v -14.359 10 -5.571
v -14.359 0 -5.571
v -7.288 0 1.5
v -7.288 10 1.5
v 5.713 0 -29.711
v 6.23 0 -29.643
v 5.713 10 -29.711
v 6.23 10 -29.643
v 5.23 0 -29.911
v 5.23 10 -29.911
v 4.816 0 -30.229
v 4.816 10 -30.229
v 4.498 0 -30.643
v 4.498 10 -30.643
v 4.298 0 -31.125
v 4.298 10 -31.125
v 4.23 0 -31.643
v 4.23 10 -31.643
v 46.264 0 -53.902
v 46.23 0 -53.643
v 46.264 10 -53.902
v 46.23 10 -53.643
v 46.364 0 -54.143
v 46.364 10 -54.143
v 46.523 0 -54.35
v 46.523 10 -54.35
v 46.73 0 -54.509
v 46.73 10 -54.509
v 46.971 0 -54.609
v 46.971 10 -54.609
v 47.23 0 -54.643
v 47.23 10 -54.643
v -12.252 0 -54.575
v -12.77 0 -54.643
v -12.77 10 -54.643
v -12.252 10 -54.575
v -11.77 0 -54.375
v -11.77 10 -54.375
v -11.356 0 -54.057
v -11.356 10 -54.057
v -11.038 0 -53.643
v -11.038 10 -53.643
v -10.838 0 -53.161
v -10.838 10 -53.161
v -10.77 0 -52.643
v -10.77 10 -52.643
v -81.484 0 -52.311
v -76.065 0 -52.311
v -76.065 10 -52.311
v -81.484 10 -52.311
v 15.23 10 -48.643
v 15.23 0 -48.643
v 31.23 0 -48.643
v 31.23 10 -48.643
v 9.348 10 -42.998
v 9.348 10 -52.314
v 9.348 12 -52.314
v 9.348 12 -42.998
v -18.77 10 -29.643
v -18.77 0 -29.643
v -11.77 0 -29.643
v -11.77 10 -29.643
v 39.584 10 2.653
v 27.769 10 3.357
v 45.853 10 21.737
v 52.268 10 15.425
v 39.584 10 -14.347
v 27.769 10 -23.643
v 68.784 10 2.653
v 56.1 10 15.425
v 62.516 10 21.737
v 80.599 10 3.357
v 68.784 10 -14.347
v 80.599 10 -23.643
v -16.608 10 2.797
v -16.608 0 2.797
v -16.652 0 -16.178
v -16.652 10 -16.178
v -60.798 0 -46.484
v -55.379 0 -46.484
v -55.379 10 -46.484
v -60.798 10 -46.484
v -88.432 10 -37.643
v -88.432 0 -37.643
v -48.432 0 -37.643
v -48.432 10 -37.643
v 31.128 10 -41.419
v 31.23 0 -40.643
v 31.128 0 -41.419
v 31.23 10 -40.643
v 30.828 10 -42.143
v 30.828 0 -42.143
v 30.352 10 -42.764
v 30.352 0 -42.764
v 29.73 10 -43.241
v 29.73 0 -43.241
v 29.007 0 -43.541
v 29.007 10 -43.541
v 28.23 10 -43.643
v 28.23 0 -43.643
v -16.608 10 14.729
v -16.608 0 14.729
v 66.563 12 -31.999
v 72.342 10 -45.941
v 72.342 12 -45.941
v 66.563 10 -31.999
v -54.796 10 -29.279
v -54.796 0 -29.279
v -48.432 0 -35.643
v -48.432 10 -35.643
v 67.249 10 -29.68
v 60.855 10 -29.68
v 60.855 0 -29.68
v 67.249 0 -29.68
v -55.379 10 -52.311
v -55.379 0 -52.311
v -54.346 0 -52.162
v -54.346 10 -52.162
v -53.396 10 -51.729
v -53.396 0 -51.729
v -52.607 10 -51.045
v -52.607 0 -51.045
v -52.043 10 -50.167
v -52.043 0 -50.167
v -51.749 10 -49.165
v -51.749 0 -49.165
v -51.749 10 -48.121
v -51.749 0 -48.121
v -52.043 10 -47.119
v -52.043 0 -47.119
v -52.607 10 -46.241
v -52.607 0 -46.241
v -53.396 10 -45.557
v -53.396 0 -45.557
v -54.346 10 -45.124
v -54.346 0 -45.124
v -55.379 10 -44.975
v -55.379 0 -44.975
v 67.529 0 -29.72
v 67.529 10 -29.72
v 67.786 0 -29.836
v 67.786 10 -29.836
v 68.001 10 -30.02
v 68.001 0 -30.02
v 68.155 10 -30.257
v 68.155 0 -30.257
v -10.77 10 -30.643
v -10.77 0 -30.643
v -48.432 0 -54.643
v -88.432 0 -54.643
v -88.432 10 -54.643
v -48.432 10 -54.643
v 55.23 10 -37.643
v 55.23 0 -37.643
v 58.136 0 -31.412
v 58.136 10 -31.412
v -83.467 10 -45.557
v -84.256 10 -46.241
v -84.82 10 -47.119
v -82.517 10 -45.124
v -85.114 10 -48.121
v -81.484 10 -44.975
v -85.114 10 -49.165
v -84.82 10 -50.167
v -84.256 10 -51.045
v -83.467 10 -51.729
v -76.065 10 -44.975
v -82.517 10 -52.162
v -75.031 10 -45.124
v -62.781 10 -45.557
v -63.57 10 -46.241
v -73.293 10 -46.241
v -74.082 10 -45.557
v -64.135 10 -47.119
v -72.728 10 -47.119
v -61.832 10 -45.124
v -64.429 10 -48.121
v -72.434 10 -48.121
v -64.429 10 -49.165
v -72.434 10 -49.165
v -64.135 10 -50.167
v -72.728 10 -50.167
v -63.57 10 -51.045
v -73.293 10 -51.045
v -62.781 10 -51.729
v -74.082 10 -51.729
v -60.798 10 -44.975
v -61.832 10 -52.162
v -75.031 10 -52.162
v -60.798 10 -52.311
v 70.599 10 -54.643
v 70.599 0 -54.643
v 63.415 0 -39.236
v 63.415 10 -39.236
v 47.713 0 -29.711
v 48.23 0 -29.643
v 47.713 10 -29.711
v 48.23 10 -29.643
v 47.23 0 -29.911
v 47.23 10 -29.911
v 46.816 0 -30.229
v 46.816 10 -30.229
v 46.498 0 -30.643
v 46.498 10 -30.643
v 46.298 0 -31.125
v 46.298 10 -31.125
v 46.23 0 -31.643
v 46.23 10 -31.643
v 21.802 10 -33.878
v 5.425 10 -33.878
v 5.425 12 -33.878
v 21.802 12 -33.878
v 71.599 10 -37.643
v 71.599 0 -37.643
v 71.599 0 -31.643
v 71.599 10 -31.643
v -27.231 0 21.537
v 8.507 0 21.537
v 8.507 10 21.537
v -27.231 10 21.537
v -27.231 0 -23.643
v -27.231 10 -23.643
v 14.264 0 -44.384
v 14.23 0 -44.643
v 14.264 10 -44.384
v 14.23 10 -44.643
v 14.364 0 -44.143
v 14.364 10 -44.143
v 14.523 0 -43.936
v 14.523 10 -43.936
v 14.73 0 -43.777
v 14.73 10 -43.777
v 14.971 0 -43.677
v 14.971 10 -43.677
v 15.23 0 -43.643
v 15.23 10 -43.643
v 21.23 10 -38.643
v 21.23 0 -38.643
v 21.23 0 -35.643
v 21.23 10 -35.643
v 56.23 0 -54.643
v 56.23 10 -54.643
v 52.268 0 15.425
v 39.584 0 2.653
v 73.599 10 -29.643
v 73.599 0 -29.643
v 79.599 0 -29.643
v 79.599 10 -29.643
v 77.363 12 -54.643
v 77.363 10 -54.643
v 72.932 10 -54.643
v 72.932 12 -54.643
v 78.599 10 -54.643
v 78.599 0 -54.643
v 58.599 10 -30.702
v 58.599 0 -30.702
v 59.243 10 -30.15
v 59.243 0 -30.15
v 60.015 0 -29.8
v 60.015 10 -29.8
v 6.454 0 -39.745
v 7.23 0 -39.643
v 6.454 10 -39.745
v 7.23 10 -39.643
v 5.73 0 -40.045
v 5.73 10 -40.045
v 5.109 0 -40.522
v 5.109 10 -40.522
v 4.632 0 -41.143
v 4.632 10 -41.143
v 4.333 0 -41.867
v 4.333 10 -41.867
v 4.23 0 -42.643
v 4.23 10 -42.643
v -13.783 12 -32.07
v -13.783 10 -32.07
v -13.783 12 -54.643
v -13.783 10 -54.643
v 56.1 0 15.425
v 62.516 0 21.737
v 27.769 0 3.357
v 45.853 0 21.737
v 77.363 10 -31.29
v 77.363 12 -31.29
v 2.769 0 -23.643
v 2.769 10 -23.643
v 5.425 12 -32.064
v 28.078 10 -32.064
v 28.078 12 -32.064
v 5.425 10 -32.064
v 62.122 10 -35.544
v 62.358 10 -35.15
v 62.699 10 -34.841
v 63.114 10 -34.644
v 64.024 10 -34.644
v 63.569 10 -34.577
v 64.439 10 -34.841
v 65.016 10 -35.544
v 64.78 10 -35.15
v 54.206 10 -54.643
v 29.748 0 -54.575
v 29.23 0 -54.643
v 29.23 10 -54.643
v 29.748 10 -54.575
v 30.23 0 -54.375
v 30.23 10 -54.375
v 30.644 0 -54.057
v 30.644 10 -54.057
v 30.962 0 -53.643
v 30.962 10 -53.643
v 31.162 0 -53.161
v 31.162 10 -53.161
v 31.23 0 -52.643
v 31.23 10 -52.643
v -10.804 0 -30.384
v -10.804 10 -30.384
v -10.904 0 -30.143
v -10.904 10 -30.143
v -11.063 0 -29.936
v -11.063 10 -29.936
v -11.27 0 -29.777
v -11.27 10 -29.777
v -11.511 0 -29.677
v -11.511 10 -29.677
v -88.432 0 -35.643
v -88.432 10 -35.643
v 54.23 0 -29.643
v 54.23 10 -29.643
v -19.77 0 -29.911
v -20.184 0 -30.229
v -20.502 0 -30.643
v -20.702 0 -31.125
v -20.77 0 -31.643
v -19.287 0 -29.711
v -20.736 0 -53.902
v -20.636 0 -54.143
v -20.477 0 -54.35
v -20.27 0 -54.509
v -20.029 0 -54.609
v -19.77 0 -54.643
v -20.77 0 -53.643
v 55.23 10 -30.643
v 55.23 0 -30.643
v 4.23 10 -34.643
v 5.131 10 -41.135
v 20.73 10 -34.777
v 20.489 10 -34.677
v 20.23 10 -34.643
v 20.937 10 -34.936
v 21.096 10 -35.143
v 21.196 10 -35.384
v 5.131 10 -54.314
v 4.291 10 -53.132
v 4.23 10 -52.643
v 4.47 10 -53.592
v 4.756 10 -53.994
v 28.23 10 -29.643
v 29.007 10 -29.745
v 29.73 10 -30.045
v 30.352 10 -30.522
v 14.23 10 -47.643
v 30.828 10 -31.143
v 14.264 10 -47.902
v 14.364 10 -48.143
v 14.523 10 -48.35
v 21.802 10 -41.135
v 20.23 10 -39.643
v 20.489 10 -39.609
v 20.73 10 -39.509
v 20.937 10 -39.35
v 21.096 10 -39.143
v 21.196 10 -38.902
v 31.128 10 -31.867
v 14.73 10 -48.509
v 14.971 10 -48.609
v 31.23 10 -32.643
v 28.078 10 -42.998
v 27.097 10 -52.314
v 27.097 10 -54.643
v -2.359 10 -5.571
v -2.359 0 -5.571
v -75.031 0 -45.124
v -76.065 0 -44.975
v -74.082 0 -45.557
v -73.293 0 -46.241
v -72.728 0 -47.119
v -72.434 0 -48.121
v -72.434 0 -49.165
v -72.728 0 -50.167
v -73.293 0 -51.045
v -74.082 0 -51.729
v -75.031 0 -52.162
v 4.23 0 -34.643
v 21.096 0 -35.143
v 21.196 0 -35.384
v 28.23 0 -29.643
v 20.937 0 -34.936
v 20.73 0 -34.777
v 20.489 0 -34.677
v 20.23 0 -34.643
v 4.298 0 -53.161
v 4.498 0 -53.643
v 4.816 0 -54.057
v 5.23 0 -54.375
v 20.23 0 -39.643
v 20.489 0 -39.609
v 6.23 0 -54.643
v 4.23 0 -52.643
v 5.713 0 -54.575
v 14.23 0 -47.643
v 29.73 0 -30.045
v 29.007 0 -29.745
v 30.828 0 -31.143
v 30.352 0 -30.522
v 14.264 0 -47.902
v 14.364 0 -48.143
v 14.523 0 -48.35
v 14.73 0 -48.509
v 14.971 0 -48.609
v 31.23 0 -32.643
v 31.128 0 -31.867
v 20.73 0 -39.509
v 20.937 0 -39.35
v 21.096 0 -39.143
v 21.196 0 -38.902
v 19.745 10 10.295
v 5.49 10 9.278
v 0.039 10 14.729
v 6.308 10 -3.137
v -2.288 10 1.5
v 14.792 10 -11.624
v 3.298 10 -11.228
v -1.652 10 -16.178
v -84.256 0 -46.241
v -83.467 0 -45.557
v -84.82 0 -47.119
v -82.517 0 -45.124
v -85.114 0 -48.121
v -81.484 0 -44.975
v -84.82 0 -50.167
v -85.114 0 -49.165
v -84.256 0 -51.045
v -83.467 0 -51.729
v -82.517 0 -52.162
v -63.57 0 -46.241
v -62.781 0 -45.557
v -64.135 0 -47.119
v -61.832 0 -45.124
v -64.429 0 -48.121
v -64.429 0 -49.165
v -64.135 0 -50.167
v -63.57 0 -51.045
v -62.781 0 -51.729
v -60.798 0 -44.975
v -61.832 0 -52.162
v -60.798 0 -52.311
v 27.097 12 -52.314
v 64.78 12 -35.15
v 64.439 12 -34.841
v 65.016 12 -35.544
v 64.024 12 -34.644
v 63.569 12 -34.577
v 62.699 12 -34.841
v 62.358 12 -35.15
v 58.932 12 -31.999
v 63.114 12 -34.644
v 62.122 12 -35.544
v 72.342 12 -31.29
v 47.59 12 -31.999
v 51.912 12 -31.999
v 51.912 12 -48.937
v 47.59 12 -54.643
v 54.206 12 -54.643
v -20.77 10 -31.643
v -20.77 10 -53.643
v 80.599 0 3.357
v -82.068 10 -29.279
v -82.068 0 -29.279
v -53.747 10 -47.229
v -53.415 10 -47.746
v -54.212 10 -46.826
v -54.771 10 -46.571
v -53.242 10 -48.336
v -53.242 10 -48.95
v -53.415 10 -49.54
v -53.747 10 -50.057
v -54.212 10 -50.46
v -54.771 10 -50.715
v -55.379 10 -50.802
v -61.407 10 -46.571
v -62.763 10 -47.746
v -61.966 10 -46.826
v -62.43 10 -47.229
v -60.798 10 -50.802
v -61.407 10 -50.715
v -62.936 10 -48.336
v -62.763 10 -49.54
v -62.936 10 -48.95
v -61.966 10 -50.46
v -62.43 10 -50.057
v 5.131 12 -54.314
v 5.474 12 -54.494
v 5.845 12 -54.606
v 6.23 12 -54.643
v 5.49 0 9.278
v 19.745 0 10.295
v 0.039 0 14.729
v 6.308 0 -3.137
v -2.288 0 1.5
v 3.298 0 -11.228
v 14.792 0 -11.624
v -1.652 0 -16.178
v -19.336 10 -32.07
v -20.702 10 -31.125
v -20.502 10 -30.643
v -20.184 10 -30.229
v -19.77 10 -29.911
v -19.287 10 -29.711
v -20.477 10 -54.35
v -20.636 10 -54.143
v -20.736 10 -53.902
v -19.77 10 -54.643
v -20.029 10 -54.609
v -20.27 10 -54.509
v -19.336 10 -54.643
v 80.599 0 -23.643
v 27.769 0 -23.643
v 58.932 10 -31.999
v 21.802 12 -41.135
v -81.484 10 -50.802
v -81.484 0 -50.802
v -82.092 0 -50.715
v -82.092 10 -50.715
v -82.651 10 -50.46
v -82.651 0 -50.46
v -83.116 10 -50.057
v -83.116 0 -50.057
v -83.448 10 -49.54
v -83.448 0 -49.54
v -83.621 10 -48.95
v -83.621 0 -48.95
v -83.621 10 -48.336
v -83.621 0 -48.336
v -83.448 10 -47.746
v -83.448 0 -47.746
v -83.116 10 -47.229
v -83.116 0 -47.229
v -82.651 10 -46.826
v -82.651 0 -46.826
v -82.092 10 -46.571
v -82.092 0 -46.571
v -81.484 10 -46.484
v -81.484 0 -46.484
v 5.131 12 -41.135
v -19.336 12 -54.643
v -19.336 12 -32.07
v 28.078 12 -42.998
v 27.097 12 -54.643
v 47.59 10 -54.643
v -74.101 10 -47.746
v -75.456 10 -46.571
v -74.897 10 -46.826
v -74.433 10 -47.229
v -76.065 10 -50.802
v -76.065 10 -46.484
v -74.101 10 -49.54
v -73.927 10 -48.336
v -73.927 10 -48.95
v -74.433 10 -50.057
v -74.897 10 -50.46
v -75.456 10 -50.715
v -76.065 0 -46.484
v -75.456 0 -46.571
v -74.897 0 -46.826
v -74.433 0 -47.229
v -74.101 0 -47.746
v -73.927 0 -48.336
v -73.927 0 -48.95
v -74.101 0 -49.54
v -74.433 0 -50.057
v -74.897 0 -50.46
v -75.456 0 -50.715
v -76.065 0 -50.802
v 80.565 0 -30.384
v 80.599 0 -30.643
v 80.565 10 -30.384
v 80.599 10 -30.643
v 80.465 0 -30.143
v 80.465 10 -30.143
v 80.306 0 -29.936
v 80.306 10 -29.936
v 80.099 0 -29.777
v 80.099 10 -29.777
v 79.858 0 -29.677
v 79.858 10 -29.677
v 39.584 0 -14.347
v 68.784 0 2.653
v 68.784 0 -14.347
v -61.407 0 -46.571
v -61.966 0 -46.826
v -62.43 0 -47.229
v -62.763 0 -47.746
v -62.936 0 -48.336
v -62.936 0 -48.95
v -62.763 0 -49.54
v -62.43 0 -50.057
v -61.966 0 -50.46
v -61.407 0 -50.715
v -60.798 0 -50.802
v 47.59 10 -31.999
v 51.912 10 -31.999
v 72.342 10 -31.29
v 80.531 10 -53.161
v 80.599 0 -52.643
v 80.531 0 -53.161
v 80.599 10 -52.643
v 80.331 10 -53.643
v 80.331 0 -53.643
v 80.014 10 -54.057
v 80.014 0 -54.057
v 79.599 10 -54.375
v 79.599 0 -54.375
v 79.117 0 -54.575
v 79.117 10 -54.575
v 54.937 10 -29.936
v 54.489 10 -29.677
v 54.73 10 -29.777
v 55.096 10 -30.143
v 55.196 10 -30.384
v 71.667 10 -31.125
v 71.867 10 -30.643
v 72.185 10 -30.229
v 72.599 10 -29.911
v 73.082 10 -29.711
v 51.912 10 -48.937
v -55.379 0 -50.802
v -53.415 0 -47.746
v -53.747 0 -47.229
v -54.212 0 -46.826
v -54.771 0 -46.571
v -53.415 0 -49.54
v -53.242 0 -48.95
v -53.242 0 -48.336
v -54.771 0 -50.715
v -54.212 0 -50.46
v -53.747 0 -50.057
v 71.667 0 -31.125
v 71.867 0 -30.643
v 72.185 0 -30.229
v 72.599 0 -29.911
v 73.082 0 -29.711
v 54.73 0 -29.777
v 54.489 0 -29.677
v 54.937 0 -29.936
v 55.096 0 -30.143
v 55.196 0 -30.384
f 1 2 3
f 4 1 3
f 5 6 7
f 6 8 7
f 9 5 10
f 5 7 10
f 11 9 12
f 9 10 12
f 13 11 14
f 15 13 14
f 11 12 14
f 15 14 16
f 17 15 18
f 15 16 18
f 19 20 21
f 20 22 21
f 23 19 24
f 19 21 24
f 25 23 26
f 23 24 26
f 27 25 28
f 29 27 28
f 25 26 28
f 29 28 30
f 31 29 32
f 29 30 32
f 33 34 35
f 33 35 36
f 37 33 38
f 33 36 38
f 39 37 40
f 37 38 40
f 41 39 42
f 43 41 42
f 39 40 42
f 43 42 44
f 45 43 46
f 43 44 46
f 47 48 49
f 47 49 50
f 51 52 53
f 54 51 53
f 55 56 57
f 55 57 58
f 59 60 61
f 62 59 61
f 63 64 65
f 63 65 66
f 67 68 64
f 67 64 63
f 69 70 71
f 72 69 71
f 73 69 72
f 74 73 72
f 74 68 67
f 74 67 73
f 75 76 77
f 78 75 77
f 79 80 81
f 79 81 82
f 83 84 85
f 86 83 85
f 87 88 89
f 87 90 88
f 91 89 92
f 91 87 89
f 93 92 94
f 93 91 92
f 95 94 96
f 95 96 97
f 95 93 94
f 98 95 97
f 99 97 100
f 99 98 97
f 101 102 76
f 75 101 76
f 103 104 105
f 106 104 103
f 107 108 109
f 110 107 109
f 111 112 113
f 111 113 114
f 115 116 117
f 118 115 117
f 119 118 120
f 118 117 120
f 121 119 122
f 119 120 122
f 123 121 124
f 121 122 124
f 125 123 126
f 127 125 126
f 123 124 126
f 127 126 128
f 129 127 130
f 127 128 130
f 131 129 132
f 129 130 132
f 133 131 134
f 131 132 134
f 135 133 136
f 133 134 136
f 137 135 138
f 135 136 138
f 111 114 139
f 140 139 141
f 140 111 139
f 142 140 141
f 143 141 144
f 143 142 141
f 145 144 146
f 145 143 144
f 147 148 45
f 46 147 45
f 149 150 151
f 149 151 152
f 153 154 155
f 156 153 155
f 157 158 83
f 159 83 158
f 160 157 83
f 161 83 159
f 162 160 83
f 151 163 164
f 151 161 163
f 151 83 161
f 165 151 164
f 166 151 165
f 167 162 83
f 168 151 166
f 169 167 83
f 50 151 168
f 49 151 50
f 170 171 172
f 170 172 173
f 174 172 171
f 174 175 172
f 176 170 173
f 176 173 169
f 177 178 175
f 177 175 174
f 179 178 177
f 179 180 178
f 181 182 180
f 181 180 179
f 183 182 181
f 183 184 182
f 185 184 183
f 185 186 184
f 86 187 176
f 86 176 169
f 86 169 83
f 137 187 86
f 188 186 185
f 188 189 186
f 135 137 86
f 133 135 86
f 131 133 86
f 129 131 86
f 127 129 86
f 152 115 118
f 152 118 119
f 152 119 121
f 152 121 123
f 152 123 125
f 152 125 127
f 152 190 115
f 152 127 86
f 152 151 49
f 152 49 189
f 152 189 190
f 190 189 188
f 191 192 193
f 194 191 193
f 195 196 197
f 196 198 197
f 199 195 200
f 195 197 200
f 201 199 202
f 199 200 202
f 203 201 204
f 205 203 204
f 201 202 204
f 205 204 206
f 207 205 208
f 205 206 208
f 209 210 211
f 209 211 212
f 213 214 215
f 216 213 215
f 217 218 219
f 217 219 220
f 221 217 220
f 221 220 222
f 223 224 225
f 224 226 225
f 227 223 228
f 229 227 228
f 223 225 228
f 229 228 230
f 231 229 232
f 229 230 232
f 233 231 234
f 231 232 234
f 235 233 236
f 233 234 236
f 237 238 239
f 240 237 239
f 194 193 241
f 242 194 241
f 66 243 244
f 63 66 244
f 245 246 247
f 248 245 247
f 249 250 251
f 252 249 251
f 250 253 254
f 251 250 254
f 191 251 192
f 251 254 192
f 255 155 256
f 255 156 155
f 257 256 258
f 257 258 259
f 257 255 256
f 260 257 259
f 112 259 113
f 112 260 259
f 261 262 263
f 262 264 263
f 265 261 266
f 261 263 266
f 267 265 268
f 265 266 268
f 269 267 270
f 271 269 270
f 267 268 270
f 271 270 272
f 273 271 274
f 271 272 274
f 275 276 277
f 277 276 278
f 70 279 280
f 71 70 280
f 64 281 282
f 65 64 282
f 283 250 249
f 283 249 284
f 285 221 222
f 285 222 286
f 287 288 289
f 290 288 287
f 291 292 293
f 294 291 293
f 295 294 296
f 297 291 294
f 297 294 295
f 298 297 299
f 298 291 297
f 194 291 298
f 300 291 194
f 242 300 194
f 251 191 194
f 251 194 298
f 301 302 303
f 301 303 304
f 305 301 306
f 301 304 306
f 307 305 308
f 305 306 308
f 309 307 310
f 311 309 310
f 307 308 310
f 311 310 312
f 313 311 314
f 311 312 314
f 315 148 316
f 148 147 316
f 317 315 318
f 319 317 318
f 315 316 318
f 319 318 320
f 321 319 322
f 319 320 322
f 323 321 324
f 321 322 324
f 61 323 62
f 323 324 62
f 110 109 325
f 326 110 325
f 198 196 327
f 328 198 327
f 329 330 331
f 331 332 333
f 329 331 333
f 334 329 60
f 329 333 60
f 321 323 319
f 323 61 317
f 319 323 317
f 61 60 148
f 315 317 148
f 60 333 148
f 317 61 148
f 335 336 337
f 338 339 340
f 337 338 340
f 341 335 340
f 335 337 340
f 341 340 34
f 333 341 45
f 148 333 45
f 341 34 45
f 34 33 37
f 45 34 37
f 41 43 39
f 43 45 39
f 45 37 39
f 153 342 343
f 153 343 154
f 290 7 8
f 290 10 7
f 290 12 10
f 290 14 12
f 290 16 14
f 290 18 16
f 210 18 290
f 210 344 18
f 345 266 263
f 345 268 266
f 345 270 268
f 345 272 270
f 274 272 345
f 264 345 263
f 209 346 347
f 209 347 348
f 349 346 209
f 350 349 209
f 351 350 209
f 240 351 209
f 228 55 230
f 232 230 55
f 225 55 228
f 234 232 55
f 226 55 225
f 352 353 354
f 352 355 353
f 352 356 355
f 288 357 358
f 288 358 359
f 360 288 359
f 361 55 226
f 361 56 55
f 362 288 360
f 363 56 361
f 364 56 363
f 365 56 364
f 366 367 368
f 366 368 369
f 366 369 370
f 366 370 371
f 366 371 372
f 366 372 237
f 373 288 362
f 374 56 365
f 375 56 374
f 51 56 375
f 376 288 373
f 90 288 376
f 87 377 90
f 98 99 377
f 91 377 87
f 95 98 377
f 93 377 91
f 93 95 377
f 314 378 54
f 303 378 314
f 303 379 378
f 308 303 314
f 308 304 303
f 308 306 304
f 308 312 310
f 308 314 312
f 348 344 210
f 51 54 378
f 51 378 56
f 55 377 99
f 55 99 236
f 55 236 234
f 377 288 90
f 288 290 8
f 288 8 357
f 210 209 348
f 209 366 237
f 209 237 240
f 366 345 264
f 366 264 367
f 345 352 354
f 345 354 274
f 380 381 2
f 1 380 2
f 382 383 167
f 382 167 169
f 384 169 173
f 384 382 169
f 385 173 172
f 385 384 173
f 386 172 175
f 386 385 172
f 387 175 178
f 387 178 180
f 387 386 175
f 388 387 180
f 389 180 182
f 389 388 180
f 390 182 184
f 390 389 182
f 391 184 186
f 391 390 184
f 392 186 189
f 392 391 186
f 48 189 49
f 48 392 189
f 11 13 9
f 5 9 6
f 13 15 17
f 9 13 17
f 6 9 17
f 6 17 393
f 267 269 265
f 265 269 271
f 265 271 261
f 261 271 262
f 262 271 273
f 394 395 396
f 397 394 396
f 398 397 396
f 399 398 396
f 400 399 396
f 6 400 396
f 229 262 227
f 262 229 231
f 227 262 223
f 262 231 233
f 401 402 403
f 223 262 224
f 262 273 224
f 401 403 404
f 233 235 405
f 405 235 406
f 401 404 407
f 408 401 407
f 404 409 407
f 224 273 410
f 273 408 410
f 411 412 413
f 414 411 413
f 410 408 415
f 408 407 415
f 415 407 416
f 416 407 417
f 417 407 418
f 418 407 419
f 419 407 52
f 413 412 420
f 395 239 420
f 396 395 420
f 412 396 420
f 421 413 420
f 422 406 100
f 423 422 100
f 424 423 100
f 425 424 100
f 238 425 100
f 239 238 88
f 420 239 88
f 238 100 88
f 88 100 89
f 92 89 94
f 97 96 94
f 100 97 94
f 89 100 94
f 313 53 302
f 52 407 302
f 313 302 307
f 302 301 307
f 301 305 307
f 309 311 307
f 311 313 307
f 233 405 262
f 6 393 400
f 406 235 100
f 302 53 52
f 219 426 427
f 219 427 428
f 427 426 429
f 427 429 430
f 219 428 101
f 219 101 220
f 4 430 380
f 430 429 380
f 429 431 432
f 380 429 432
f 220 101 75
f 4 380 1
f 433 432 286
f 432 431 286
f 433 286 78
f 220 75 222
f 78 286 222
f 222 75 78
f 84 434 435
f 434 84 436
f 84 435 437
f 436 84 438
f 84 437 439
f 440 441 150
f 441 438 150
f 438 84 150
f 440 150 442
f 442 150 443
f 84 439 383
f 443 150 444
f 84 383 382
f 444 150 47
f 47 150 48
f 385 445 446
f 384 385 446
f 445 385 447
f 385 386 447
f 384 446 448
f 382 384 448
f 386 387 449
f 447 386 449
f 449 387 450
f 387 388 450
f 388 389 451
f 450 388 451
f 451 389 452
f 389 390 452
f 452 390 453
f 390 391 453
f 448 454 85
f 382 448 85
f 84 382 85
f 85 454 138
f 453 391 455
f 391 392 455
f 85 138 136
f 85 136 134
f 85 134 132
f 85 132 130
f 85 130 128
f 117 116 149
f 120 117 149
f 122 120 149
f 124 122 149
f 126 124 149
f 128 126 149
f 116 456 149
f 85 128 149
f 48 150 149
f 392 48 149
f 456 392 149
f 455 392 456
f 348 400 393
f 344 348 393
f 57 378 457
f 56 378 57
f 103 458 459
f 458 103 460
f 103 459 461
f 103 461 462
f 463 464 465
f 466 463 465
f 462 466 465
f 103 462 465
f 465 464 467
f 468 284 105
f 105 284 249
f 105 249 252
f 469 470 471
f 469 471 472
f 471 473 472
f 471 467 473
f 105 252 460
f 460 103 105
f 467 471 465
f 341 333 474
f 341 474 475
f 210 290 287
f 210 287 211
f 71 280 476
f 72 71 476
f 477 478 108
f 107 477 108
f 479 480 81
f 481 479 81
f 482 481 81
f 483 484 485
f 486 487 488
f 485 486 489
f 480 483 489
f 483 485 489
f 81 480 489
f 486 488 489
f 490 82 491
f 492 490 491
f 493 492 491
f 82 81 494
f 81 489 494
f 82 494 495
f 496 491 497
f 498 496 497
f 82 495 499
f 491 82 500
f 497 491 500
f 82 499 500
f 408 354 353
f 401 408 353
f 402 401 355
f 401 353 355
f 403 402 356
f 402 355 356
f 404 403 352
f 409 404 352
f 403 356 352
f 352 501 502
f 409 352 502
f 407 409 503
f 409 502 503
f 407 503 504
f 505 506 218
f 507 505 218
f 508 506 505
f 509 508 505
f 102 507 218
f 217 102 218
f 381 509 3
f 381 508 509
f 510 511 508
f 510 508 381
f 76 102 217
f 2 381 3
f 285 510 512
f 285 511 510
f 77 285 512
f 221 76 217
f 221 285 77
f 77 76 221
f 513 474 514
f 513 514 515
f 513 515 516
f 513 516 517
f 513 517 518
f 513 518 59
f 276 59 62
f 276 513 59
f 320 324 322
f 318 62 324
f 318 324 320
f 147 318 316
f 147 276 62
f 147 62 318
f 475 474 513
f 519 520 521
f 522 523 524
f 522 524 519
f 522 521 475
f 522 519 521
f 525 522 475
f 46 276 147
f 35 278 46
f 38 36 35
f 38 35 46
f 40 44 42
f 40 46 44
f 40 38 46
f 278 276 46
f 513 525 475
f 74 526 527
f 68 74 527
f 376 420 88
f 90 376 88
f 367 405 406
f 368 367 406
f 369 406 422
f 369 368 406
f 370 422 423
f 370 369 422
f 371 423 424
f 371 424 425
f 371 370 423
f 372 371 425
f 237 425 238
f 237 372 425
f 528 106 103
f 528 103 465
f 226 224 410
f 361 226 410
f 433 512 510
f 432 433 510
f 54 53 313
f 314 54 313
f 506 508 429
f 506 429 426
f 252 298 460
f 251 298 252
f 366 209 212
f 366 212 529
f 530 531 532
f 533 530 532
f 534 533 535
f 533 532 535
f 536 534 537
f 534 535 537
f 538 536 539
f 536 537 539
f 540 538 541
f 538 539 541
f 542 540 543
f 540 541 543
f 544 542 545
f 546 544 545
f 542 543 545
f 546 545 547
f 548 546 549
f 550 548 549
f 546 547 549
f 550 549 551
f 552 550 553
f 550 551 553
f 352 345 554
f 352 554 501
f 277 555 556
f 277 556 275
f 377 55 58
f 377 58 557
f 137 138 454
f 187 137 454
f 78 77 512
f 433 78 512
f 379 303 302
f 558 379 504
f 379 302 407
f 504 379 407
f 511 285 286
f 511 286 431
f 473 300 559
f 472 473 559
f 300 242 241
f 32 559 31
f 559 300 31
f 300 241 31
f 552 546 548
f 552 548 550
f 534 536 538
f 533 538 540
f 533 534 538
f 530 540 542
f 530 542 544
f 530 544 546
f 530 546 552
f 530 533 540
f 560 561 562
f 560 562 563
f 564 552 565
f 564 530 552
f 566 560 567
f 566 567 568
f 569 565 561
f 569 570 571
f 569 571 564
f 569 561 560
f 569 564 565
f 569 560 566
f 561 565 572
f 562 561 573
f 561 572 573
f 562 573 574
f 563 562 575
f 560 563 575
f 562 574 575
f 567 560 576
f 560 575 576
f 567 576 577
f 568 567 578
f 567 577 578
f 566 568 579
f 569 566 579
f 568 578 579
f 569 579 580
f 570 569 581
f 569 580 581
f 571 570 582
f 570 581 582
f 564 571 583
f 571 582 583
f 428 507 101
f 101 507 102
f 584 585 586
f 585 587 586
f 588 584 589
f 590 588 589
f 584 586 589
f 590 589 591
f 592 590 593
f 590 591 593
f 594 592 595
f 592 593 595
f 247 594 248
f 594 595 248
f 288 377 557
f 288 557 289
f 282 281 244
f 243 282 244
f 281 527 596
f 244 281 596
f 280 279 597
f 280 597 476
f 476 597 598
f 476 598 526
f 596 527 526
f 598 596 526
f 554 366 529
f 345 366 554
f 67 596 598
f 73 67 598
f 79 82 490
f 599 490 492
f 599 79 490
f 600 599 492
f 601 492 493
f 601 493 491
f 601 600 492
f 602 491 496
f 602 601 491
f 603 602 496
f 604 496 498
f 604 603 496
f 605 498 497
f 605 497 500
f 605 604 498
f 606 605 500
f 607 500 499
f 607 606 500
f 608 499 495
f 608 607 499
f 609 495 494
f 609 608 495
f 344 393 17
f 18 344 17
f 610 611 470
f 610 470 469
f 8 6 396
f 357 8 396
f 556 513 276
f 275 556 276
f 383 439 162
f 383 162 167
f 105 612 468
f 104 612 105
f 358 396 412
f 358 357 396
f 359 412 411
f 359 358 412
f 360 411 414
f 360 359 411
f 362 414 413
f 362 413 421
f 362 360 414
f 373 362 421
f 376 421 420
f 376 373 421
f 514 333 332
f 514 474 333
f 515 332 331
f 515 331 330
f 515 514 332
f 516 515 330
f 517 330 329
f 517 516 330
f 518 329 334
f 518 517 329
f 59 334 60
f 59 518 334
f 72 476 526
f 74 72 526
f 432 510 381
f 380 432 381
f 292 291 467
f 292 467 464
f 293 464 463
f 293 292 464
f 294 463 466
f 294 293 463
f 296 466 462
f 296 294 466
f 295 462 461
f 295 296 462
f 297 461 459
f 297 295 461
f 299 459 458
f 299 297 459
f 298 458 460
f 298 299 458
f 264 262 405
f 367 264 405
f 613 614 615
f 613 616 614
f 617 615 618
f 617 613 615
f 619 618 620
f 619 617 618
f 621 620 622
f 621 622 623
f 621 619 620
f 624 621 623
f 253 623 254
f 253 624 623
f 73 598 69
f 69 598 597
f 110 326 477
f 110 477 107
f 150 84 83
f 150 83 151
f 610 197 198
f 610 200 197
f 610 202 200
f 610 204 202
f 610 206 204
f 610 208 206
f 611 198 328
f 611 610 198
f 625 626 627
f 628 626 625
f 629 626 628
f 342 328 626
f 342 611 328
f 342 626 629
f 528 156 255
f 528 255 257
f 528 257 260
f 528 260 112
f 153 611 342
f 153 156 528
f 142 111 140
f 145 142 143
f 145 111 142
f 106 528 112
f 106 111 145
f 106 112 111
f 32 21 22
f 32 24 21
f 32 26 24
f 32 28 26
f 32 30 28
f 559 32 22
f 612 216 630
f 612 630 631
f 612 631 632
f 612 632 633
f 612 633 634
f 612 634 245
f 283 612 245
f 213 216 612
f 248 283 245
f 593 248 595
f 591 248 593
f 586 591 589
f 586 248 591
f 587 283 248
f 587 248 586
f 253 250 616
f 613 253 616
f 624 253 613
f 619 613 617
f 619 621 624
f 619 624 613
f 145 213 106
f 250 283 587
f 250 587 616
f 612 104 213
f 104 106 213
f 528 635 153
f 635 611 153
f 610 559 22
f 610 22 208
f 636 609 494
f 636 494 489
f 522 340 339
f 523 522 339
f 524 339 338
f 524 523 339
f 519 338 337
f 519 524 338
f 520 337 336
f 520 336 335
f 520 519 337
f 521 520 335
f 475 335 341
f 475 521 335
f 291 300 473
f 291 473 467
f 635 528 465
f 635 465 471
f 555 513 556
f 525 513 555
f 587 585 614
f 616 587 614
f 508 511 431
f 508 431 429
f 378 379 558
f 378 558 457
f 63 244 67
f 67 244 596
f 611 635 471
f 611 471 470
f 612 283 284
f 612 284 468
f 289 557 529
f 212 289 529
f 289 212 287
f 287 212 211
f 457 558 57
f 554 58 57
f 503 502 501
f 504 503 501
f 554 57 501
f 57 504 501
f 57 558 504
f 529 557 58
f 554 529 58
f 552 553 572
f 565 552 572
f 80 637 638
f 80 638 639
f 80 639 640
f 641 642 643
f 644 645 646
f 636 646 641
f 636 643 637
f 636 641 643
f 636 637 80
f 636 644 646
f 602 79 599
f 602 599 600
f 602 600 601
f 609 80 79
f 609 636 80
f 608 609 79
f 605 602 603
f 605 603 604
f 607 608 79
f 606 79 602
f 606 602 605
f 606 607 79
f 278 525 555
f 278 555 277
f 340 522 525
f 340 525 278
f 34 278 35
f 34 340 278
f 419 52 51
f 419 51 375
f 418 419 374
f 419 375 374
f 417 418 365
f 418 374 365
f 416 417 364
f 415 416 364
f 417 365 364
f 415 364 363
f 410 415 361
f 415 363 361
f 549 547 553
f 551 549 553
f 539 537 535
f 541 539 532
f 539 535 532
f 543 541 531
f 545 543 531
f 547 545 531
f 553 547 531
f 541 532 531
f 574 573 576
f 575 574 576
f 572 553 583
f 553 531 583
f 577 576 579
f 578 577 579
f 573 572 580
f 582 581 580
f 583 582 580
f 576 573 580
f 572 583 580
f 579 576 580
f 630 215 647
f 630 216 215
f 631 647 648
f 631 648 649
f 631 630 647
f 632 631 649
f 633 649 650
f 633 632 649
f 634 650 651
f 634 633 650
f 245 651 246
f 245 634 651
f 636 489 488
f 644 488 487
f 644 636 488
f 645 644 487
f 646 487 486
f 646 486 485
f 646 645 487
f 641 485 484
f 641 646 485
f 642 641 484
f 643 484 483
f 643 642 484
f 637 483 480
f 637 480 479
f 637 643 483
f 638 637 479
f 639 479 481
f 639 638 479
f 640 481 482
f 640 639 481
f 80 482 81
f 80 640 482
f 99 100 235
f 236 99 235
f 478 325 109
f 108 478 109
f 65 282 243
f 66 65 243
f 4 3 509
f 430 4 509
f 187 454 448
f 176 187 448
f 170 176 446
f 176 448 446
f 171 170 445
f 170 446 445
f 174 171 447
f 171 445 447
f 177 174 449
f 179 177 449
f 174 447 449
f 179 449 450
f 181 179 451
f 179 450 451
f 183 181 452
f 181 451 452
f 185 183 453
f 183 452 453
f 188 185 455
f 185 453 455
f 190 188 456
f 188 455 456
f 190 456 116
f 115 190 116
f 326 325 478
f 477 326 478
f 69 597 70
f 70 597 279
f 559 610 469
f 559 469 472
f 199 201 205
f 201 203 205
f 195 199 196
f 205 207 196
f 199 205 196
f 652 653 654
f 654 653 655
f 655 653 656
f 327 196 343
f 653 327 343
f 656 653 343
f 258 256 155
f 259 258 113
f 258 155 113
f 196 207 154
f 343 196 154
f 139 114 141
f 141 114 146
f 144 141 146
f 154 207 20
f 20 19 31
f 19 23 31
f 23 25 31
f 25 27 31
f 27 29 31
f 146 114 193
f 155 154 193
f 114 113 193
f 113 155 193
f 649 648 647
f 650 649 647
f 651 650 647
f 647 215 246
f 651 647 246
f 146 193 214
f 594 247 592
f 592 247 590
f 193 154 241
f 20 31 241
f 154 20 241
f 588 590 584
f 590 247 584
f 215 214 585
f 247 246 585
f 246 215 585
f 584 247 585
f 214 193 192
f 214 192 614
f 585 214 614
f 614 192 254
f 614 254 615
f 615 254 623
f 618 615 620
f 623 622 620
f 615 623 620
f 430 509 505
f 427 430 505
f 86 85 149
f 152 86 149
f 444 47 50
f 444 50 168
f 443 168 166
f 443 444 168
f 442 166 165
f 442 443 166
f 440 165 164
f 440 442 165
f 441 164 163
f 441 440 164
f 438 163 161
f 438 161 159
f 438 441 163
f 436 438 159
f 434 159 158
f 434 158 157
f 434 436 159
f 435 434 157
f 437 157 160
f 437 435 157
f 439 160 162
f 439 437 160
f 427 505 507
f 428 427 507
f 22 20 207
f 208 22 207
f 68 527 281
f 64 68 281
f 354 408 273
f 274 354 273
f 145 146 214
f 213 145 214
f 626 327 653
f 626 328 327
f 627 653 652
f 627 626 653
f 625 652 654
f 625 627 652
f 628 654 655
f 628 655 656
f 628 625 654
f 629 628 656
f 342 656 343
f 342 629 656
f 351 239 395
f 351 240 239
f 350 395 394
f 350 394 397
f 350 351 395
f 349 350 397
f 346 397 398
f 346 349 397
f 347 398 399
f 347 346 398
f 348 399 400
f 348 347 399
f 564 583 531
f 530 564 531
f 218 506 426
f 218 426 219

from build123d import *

# Parameters (mm, degrees)
BOSS_EXTRUDE1_DEPTH   = 10
BOSS_EXTRUDE1_2_DEPTH = 10
BOSS_EXTRUDE1_3_DEPTH = 10
BOSS_EXTRUDE1_4_DEPTH = 10
SKETCH2_W             = 10
SKETCH2_H             = 25
BOSS_EXTRUDE1_5_DEPTH = 10
BOSS_EXTRUDE1_6_DEPTH = 10
SKETCH2_W_2           = 40
SKETCH2_H_2           = 17
BOSS_EXTRUDE1_7_DEPTH = 10
BOSS_EXTRUDE1_8_DEPTH = 10
BOSS_EXTRUDE1_9_DEPTH = 10
SKETCH3_W             = 5.552922641
SKETCH3_H             = 22.573169384
BOSS_EXTRUDE2_DEPTH   = 2
BOSS_EXTRUDE3_DEPTH   = 2
BOSS_EXTRUDE4_DEPTH   = 2
FILLET1_R             = 3
FILLET2_R             = 2
FILLET3_R             = 3
FILLET4_R             = 1
FILLET5_R             = 3
FILLET6_R             = 2
FILLET7_R             = 1
FILLET8_R             = 2
FILLET9_R             = 2
FILLET10_R            = 1


with BuildPart() as part:
    # Sketch2 → Boss-Extrude1 (new body)
    with BuildSketch(Plane(origin=(0, 0, 0), x_dir=(1, 0, 0), z_dir=(0, 1, 0))):
        Polygon((8.507188085, -21.536984564), (-27.230698714, -21.536984564), (-27.230698714, 23.643015436), (2.769301286, 23.643015436), (14.792005366, 11.624089252), (6.308057472, 3.137474608), (19.745197326, -10.295442892), align=None)
        Polygon((5.490159492, -9.277894373), (0.038625294, -14.729428571), (-16.608, -14.729428571), (-16.608, -2.796857143), (-16.651976131, 16.17794975), (-1.651976131, 16.17794975), (3.297771337, 11.228202282), (-2.359082913, 5.571348032), (-14.359082913, 5.571348032), (-7.288015101, -1.49971978), (-2.288015101, -1.49971978), align=None, mode=Mode.SUBTRACT)
    extrude(amount=BOSS_EXTRUDE1_DEPTH)


with BuildPart() as body_2:
    # Sketch2 → Boss-Extrude1 2 (new body)
    with BuildSketch(Plane(origin=(0, 0, 0), x_dir=(1, 0, 0), z_dir=(0, 1, 0))):
        Polygon((52.268367855, -15.424806221), (39.584301286, -2.653179258), (39.584301286, 14.346820742), (68.784301286, 14.346820742), (68.784301286, -2.653179258), (56.100234718, -15.424806221), (62.515689668, -21.736853256), (80.599301286, -3.356984564), (80.599301286, 23.643015436), (27.769301286, 23.643015436), (27.769301286, -3.356984564), (45.852912904, -21.736853256), align=None)
    extrude(amount=BOSS_EXTRUDE1_2_DEPTH)


with BuildPart() as body_3:
    # Sketch2 → Boss-Extrude1 3 (new body)
    with BuildSketch(Plane(origin=(0, 0, 0), x_dir=(1, 0, 0), z_dir=(0, 1, 0))):
        Polygon((71.599301286, 29.643015436), (80.599301286, 29.643015436), (80.599301286, 54.643015436), (70.599301286, 54.643015436), (63.414790837, 39.235783056), (56.230280387, 54.643015436), (46.230280387, 54.643015436), (46.230280387, 29.643015436), (55.230280387, 29.643015436), (55.230280387, 37.643015436), (58.943621004, 29.679730786), (63.38596067, 29.679730786), (63.414790837, 29.679730786), (67.88596067, 29.679730786), (71.599301286, 37.643015436), align=None)
    extrude(amount=BOSS_EXTRUDE1_3_DEPTH)

    # Sketch5 → Boss-Extrude4 (add)
    with BuildSketch(Plane(origin=(0, 10, 0), x_dir=(1, 0, 0), z_dir=(0, 1, 0))):
        with BuildLine():
            Line((47.589769515, 31.999354556), (47.589769515, 54.643015436))
            Line((47.589769515, 54.643015436), (54.206017768, 54.643015436))
            Line((54.206017768, 54.643015436), (62.121886213, 35.543773263))
            ThreePointArc((62.121886213, 35.543773263), (63.569190519, 34.576935425), (65.016494824, 35.543773263))
            Line((65.016494824, 35.543773263), (72.93236327, 54.643015436))
            Line((72.93236327, 54.643015436), (77.362886653, 54.643015436))
            Line((77.362886653, 54.643015436), (77.362886653, 31.290470814))
            Line((77.362886653, 31.290470814), (72.341626818, 31.290470814))
            Line((72.341626818, 31.290470814), (72.341626818, 45.940734803))
            Line((72.341626818, 45.940734803), (66.563484891, 31.999354556))
            Line((66.563484891, 31.999354556), (58.931909377, 31.999354556))
            Line((58.931909377, 31.999354556), (51.911817177, 48.9372865))
            Line((51.911817177, 48.9372865), (51.911817177, 31.999354556))
            Line((51.911817177, 31.999354556), (47.589769515, 31.999354556))
        make_face()
    extrude(amount=BOSS_EXTRUDE4_DEPTH)

    # Fillet5
    fillet5_edges = [body_3.edges().sort_by_distance(p)[0] for p in [
        (58.943621004, 5, -29.679730786),
    ]]
    fillet(fillet5_edges, radius=FILLET5_R)

    # Fillet6
    fillet6_edges = [body_3.edges().sort_by_distance(p)[0] for p in [
        (80.599301286, 5, -54.643015436),
        (71.599301286, 5, -29.643015436),
        (46.230280387, 5, -29.643015436),
    ]]
    fillet(fillet6_edges, radius=FILLET6_R)

    # Fillet7
    fillet7_edges = [body_3.edges().sort_by_distance(p)[0] for p in [
        (80.599301286, 5, -29.643015436),
        (67.88596067, 5, -29.679730786),
        (55.230280387, 5, -29.643015436),
        (46.230280387, 5, -54.643015436),
    ]]
    fillet(fillet7_edges, radius=FILLET7_R)


with BuildPart() as body_4:
    # Sketch2 → Boss-Extrude1 4 (new body)
    with BuildSketch(Plane(origin=(0, 0, 0), x_dir=(1, 0, 0), z_dir=(0, 1, 0))):
        Polygon((4.230280387, 29.643015436), (31.230280387, 29.643015436), (31.230280387, 43.643015436), (14.230280387, 43.643015436), (14.230280387, 48.643015436), (31.230280387, 48.643015436), (31.230280387, 54.643015436), (4.230280387, 54.643015436), (4.230280387, 39.643015436), (21.230280387, 39.643015436), (21.230280387, 34.643015436), (4.230280387, 34.643015436), align=None)
    extrude(amount=BOSS_EXTRUDE1_4_DEPTH)

    # Sketch4 → Boss-Extrude3 (add)
    with BuildSketch(Plane(origin=(0, 10, 0), x_dir=(1, 0, 0), z_dir=(0, 1, 0))):
        Polygon((27.097094219, 54.643015436), (27.097094219, 52.313601998), (9.347826807, 52.313601998), (9.347826807, 42.997688163), (28.077716728, 42.997688163), (28.077716728, 32.063747189), (5.425336772, 32.063747189), (5.425336772, 33.87789883), (21.801732671, 33.87789883), (21.801732671, 41.134505396), (5.131150019, 41.134505396), (5.131150019, 54.643015436), align=None)
    extrude(amount=BOSS_EXTRUDE3_DEPTH)

    # Fillet1
    fillet1_edges = [body_4.edges().sort_by_distance(p)[0] for p in [
        (31.230280387, 5, -43.643015436),
        (31.230280387, 5, -29.643015436),
    ]]
    fillet(fillet1_edges, radius=FILLET1_R)

    # Fillet2
    fillet2_edges = [body_4.edges().sort_by_distance(p)[0] for p in [
        (4.230280387, 5, -54.643015436),
        (4.230280387, 5, -29.643015436),
        (31.230280387, 5, -54.643015436),
    ]]
    fillet(fillet2_edges, radius=FILLET2_R)

    # Fillet3
    fillet3_edges = [body_4.edges().sort_by_distance(p)[0] for p in [
        (4.230280387, 5, -39.643015436),
    ]]
    fillet(fillet3_edges, radius=FILLET3_R)

    # Fillet4
    fillet4_edges = [body_4.edges().sort_by_distance(p)[0] for p in [
        (21.230280387, 5, -34.643015436),
        (21.230280387, 5, -39.643015436),
        (14.230280387, 5, -48.643015436),
        (14.230280387, 5, -43.643015436),
    ]]
    fillet(fillet4_edges, radius=FILLET4_R)


with BuildPart() as body_5:
    # Sketch2 → Boss-Extrude1 5 (new body)
    with BuildSketch(Plane(origin=(0, 0, 0), x_dir=(1, 0, 0), z_dir=(0, 1, 0))):
        with Locations((-15.769719613, 42.143015436)):
            Rectangle(SKETCH2_W, SKETCH2_H)
    extrude(amount=BOSS_EXTRUDE1_5_DEPTH)

    # Sketch3 → Boss-Extrude2 (add)
    with BuildSketch(Plane(origin=(0, 10, 0), x_dir=(1, 0, 0), z_dir=(0, 1, 0))):
        with Locations((-16.559233642, 43.356430744)):
            Rectangle(SKETCH3_W, SKETCH3_H)
    extrude(amount=BOSS_EXTRUDE2_DEPTH)

    # Fillet8
    fillet8_edges = [body_5.edges().sort_by_distance(p)[0] for p in [
        (-20.769719613, 5, -29.643015436),
    ]]
    fillet(fillet8_edges, radius=FILLET8_R)

    # Fillet9
    fillet9_edges = [body_5.edges().sort_by_distance(p)[0] for p in [
        (-10.769719613, 5, -54.643015436),
    ]]
    fillet(fillet9_edges, radius=FILLET9_R)

    # Fillet10
    fillet10_edges = [body_5.edges().sort_by_distance(p)[0] for p in [
        (-10.769719613, 5, -29.643015436),
        (-20.769719613, 5, -54.643015436),
    ]]
    fillet(fillet10_edges, radius=FILLET10_R)


with BuildPart() as body_6:
    # Sketch2 → Boss-Extrude1 6 (new body)
    with BuildSketch(Plane(origin=(0, 0, 0), x_dir=(1, 0, 0), z_dir=(0, 1, 0))):
        Polygon((-88.431569856, 35.643015436), (-82.067608825, 29.279054405), (-54.795530886, 29.279054405), (-48.431569856, 35.643015436), align=None)
    extrude(amount=BOSS_EXTRUDE1_6_DEPTH)


with BuildPart() as body_7:
    # Sketch2 → Boss-Extrude1 7 (new body)
    with BuildSketch(Plane(origin=(0, 0, 0), x_dir=(1, 0, 0), z_dir=(0, 1, 0))):
        with Locations((-68.431569856, 46.143015436)):
            Rectangle(SKETCH2_W_2, SKETCH2_H_2)
        with BuildLine():
            ThreePointArc((-76.064855636, 44.975142941), (-72.396983141, 48.643015436), (-76.064855636, 52.310887931))
            Line((-76.064855636, 52.310887931), (-81.483826522, 52.310887931))
            ThreePointArc((-81.483826522, 52.310887931), (-85.151699017, 48.643015436), (-81.483826522, 44.975142941))
            Line((-81.483826522, 44.975142941), (-76.064855636, 44.975142941))
        make_face(mode=Mode.SUBTRACT)
        with BuildLine():
            Line((-55.379313189, 44.975142941), (-60.798284075, 44.975142941))
            ThreePointArc((-60.798284075, 44.975142941), (-64.46615657, 48.643015436), (-60.798284075, 52.310887931))
            Line((-60.798284075, 52.310887931), (-55.379313189, 52.310887931))
            ThreePointArc((-55.379313189, 52.310887931), (-51.711440694, 48.643015436), (-55.379313189, 44.975142941))
        make_face(mode=Mode.SUBTRACT)
    extrude(amount=BOSS_EXTRUDE1_7_DEPTH)


with BuildPart() as body_8:
    # Sketch2 → Boss-Extrude1 8 (new body)
    with BuildSketch(Plane(origin=(0, 0, 0), x_dir=(1, 0, 0), z_dir=(0, 1, 0))):
        with BuildLine():
            Line((-81.483826522, 46.483591027), (-76.064855636, 46.483591027))
            ThreePointArc((-76.064855636, 46.483591027), (-73.905431227, 48.643015436), (-76.064855636, 50.802439846))
            Line((-76.064855636, 50.802439846), (-81.483826522, 50.802439846))
            ThreePointArc((-81.483826522, 50.802439846), (-83.643250932, 48.643015436), (-81.483826522, 46.483591027))
        make_face()
    extrude(amount=BOSS_EXTRUDE1_8_DEPTH)


with BuildPart() as body_9:
    # Sketch2 → Boss-Extrude1 9 (new body)
    with BuildSketch(Plane(origin=(0, 0, 0), x_dir=(1, 0, 0), z_dir=(0, 1, 0))):
        with BuildLine():
            ThreePointArc((-60.798284075, 46.483591027), (-62.957708484, 48.643015436), (-60.798284075, 50.802439846))
            Line((-60.798284075, 50.802439846), (-55.379313189, 50.802439846))
            ThreePointArc((-55.379313189, 50.802439846), (-53.21988878, 48.643015436), (-55.379313189, 46.483591027))
            Line((-55.379313189, 46.483591027), (-60.798284075, 46.483591027))
        make_face()
    extrude(amount=BOSS_EXTRUDE1_9_DEPTH)


solid = Compound([part.part, body_2.part, body_3.part, body_4.part, body_5.part, body_6.part, body_7.part, body_8.part, body_9.part])
